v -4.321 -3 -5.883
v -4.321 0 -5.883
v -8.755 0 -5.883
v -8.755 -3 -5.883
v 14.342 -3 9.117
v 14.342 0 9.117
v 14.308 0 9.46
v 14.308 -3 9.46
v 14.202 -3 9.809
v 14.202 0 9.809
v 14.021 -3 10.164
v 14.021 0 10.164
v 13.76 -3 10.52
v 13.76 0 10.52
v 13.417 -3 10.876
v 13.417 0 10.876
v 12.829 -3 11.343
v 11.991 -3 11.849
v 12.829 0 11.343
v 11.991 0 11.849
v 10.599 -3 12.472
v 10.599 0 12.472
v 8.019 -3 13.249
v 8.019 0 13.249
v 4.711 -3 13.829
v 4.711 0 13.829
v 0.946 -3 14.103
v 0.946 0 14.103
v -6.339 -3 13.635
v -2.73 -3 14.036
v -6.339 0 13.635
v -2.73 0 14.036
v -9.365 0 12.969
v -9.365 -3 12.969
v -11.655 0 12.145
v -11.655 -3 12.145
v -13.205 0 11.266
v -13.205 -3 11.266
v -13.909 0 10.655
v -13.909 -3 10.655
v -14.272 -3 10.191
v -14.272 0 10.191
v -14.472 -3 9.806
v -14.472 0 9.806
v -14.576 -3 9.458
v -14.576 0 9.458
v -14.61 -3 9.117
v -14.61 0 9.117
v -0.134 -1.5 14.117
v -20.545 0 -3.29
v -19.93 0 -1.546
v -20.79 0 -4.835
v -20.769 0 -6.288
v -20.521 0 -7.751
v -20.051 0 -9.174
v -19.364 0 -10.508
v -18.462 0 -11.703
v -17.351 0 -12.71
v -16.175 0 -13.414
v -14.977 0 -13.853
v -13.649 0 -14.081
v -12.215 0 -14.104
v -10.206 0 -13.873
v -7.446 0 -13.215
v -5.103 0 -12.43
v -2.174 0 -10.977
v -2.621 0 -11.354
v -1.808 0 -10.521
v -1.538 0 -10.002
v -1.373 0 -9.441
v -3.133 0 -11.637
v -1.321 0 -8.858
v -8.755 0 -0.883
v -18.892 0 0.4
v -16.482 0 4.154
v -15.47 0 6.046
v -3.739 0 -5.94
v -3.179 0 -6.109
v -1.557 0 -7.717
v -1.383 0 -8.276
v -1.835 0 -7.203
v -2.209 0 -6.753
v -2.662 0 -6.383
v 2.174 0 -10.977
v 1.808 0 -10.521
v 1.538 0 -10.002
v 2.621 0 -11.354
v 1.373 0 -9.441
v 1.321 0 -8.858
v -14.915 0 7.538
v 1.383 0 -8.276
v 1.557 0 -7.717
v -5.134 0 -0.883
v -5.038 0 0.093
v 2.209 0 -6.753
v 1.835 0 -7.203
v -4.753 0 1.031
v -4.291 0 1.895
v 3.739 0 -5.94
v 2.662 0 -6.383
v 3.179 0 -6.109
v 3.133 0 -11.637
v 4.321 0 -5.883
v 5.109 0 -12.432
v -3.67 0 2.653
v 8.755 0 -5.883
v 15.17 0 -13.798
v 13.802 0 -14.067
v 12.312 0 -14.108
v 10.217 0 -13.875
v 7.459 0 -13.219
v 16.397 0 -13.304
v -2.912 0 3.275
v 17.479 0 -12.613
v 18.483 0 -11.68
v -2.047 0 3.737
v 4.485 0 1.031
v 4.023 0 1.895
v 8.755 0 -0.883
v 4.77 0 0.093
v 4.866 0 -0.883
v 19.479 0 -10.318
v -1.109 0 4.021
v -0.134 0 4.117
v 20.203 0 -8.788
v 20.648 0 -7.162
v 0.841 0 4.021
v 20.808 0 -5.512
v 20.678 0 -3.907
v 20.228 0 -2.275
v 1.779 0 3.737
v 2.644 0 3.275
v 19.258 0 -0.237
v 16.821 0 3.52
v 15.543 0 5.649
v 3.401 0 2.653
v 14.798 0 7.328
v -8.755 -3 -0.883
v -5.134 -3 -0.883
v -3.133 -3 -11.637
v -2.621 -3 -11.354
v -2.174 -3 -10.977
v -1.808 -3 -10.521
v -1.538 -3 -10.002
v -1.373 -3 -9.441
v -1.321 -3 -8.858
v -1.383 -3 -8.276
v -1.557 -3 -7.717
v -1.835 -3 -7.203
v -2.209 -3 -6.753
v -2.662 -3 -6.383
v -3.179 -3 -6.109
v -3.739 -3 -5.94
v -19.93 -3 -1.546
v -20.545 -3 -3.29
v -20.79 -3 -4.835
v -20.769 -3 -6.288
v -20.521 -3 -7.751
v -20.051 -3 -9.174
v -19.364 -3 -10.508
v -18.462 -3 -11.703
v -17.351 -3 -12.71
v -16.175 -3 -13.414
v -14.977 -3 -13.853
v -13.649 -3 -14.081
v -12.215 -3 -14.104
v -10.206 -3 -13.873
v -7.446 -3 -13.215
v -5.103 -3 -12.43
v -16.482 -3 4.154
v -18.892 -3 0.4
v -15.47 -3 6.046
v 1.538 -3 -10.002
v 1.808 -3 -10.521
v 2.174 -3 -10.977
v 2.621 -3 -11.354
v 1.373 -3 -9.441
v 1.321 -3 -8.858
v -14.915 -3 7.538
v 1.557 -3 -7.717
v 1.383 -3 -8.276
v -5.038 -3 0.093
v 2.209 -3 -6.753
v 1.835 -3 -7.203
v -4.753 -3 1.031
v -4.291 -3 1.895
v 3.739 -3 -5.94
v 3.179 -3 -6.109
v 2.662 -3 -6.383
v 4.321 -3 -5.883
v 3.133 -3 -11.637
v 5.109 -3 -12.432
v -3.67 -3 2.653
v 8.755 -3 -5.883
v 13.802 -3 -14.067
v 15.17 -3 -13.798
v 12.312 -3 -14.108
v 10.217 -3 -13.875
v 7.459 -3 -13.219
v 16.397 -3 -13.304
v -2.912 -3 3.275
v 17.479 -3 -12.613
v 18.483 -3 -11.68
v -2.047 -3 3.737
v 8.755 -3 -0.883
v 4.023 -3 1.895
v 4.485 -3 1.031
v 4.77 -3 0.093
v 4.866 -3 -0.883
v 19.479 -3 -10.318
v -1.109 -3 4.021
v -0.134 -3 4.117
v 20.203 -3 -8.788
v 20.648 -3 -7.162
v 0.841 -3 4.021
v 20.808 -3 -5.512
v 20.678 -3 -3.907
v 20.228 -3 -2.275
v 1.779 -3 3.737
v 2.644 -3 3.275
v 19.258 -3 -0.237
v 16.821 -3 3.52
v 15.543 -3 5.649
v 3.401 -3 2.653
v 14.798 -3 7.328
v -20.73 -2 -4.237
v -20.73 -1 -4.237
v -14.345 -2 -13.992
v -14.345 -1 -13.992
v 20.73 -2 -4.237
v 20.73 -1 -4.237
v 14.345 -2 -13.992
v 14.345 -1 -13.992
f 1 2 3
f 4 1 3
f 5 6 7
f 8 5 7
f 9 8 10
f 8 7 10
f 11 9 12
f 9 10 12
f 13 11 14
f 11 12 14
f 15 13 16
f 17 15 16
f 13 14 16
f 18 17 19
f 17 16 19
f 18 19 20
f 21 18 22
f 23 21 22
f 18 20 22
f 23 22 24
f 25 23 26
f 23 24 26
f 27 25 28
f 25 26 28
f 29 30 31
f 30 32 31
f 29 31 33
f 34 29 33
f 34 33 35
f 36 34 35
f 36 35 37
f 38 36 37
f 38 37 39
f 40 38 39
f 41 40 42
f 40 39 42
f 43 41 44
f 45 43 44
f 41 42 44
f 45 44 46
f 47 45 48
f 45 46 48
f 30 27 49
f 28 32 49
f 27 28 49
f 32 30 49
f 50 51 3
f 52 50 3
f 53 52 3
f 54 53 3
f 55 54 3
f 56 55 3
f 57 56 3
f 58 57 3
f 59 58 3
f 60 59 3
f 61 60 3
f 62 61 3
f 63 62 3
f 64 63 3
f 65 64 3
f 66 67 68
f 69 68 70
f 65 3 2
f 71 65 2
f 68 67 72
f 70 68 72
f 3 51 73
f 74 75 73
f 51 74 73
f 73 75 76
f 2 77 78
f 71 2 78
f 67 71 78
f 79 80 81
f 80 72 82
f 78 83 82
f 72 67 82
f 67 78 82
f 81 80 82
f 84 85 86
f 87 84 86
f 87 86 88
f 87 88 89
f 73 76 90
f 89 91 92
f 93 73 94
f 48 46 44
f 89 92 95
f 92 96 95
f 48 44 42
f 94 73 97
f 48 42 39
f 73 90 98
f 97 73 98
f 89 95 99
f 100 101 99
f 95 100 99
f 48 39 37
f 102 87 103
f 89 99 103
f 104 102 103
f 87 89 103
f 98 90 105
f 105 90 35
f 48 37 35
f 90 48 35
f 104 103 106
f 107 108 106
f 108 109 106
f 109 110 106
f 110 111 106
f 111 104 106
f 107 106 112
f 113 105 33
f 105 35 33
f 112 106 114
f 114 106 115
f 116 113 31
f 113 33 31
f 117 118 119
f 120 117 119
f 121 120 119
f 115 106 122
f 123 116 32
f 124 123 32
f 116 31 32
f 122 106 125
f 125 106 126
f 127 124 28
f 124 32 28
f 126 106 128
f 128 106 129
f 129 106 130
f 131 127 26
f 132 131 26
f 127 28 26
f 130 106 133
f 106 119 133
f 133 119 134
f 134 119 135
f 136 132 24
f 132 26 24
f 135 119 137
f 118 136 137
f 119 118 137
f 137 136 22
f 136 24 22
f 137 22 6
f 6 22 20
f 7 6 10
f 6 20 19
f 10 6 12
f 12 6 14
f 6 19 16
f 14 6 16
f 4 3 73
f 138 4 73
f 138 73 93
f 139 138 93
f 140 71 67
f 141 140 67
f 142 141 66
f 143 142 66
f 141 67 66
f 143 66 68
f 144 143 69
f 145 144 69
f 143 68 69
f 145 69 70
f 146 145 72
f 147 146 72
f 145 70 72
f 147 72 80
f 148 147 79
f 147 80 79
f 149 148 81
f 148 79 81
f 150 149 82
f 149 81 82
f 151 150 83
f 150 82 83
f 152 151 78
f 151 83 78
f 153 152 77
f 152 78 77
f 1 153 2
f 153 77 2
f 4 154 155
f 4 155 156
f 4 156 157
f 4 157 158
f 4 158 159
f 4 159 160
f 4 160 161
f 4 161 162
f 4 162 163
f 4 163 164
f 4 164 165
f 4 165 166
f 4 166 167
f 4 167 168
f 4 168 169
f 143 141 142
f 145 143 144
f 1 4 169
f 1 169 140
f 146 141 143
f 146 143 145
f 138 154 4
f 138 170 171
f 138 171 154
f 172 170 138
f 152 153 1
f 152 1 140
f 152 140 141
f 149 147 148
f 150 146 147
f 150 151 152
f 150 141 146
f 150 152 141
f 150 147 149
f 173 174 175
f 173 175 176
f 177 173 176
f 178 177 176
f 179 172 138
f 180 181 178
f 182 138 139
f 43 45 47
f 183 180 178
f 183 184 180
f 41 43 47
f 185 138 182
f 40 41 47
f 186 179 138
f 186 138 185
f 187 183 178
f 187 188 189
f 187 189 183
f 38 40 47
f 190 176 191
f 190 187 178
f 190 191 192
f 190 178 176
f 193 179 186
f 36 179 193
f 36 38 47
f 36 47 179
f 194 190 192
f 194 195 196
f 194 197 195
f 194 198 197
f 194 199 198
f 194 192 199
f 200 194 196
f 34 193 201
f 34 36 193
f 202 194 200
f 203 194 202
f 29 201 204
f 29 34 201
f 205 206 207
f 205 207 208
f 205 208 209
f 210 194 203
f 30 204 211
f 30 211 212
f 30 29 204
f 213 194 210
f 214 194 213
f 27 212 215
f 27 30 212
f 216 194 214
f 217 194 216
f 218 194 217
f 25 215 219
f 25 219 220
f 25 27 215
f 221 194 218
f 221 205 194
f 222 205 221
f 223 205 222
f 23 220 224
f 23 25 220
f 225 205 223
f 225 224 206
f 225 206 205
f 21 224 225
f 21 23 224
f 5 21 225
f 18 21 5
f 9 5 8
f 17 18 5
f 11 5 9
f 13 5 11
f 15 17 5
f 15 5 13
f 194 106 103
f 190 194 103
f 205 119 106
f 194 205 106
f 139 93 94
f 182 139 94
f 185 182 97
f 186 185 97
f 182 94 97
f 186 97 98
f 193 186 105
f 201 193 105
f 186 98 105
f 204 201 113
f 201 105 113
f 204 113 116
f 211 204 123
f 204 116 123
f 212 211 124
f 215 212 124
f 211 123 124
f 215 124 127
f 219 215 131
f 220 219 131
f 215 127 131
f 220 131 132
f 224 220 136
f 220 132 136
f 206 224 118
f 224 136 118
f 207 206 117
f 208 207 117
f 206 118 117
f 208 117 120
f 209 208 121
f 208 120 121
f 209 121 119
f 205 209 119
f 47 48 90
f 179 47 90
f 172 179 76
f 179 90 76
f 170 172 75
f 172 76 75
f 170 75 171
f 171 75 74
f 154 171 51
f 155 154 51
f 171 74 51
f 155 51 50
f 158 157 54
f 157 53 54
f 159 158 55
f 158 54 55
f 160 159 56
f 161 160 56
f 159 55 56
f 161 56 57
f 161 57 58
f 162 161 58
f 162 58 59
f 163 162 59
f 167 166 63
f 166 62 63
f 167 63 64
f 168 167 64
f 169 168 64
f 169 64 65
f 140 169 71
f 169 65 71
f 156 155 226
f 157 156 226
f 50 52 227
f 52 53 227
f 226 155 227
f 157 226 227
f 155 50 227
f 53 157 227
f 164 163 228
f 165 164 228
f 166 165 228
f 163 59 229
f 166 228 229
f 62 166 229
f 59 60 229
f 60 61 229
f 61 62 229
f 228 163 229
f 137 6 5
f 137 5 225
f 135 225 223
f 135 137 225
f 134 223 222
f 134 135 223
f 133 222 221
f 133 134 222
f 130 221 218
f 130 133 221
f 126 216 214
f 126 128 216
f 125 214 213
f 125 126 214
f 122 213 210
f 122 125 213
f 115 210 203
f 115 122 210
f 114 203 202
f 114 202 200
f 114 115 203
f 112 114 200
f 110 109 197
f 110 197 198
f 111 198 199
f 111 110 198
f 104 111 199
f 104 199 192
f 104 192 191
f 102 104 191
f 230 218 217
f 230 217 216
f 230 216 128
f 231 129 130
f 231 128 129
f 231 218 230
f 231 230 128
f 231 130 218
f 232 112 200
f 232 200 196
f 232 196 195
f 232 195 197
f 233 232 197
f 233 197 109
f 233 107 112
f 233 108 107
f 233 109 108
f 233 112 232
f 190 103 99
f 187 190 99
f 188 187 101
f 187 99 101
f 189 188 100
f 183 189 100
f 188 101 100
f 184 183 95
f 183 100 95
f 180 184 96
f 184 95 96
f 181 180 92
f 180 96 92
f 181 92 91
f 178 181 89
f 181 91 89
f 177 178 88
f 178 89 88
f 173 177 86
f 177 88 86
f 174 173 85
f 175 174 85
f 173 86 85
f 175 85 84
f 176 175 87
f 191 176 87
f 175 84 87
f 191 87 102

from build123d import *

# Parameters (mm, degrees)
F1_DEPTH = 3


# Not quite as in the source:
# - ends of sketch curves that miss each other by under 0.0002 mm in the source are joined
# - the dataset's text gives a spline's control points without its knots; the knots are read off the source's solid


with BuildPart() as f1:
    # F0 (on Front) → F1 (new body)
    with BuildSketch(Plane.XZ):
        with BuildLine():
            Line((-4.321138, -5.882648), (-8.755, -5.882648))
            Line((-8.755, -5.882648), (-8.755, -0.882648))
            Line((-8.755, -0.882648), (-5.134039, -0.882648))
            ThreePointArc((-5.134039, -0.882648), (-0.134039, 4.117352), (4.865961, -0.882648))
            Line((4.865961, -0.882648), (8.755, -0.882648))
            Line((8.755, -0.882648), (8.755, -5.882648))
            Line((8.755, -5.882648), (4.321137, -5.882648))
            ThreePointArc((4.321137, -5.882648), (1.3830953266, -8.2760912214), (3.1330776048, -11.6373739162))
            add(Edge.make_bspline(
                [(14.341757, 9.117352), (15.09434, 4.111526), (24.07864, -2.094143), (17.273633, -16.953755), (5.88345, -12.823555), (3.1330776048, -11.6373739162)],
                knots=[28.987347, 28.987347, 28.987347, 28.987347, 42.872008, 54.1154, 62.665306, 62.665306, 62.665306, 62.665306], degree=3))
            add(Edge.make_bspline(
                [(14.341757, 9.117352), (14.341757, 14.117352866), (-0.1340415073, 14.117352), (-14.6098400146, 14.117351134), (-14.609835, 9.1173502679)],
                knots=[0, 0, 0, 1.5707965, 1.5707965, 3.141593, 3.141593, 3.141593], degree=2, weights=[1, 0.7071067199, 1, 0.7071067199, 1]))
            add(Edge.make_bspline(
                [(-14.609835, 9.1173502679), (-15.094341, 4.111526), (-24.078641, -2.094143), (-17.273634, -16.953755), (-5.883451, -12.823555), (-3.133078, -11.637373)],
                knots=[28.987347, 28.987347, 28.987347, 28.987347, 42.872008, 54.1154, 62.665306, 62.665306, 62.665306, 62.665306], degree=3))
            ThreePointArc((-3.133078, -11.637373), (-1.3830964195, -8.2760907718), (-4.321138, -5.882648))
        make_face()
    extrude(amount=F1_DEPTH)


solid = f1.part
